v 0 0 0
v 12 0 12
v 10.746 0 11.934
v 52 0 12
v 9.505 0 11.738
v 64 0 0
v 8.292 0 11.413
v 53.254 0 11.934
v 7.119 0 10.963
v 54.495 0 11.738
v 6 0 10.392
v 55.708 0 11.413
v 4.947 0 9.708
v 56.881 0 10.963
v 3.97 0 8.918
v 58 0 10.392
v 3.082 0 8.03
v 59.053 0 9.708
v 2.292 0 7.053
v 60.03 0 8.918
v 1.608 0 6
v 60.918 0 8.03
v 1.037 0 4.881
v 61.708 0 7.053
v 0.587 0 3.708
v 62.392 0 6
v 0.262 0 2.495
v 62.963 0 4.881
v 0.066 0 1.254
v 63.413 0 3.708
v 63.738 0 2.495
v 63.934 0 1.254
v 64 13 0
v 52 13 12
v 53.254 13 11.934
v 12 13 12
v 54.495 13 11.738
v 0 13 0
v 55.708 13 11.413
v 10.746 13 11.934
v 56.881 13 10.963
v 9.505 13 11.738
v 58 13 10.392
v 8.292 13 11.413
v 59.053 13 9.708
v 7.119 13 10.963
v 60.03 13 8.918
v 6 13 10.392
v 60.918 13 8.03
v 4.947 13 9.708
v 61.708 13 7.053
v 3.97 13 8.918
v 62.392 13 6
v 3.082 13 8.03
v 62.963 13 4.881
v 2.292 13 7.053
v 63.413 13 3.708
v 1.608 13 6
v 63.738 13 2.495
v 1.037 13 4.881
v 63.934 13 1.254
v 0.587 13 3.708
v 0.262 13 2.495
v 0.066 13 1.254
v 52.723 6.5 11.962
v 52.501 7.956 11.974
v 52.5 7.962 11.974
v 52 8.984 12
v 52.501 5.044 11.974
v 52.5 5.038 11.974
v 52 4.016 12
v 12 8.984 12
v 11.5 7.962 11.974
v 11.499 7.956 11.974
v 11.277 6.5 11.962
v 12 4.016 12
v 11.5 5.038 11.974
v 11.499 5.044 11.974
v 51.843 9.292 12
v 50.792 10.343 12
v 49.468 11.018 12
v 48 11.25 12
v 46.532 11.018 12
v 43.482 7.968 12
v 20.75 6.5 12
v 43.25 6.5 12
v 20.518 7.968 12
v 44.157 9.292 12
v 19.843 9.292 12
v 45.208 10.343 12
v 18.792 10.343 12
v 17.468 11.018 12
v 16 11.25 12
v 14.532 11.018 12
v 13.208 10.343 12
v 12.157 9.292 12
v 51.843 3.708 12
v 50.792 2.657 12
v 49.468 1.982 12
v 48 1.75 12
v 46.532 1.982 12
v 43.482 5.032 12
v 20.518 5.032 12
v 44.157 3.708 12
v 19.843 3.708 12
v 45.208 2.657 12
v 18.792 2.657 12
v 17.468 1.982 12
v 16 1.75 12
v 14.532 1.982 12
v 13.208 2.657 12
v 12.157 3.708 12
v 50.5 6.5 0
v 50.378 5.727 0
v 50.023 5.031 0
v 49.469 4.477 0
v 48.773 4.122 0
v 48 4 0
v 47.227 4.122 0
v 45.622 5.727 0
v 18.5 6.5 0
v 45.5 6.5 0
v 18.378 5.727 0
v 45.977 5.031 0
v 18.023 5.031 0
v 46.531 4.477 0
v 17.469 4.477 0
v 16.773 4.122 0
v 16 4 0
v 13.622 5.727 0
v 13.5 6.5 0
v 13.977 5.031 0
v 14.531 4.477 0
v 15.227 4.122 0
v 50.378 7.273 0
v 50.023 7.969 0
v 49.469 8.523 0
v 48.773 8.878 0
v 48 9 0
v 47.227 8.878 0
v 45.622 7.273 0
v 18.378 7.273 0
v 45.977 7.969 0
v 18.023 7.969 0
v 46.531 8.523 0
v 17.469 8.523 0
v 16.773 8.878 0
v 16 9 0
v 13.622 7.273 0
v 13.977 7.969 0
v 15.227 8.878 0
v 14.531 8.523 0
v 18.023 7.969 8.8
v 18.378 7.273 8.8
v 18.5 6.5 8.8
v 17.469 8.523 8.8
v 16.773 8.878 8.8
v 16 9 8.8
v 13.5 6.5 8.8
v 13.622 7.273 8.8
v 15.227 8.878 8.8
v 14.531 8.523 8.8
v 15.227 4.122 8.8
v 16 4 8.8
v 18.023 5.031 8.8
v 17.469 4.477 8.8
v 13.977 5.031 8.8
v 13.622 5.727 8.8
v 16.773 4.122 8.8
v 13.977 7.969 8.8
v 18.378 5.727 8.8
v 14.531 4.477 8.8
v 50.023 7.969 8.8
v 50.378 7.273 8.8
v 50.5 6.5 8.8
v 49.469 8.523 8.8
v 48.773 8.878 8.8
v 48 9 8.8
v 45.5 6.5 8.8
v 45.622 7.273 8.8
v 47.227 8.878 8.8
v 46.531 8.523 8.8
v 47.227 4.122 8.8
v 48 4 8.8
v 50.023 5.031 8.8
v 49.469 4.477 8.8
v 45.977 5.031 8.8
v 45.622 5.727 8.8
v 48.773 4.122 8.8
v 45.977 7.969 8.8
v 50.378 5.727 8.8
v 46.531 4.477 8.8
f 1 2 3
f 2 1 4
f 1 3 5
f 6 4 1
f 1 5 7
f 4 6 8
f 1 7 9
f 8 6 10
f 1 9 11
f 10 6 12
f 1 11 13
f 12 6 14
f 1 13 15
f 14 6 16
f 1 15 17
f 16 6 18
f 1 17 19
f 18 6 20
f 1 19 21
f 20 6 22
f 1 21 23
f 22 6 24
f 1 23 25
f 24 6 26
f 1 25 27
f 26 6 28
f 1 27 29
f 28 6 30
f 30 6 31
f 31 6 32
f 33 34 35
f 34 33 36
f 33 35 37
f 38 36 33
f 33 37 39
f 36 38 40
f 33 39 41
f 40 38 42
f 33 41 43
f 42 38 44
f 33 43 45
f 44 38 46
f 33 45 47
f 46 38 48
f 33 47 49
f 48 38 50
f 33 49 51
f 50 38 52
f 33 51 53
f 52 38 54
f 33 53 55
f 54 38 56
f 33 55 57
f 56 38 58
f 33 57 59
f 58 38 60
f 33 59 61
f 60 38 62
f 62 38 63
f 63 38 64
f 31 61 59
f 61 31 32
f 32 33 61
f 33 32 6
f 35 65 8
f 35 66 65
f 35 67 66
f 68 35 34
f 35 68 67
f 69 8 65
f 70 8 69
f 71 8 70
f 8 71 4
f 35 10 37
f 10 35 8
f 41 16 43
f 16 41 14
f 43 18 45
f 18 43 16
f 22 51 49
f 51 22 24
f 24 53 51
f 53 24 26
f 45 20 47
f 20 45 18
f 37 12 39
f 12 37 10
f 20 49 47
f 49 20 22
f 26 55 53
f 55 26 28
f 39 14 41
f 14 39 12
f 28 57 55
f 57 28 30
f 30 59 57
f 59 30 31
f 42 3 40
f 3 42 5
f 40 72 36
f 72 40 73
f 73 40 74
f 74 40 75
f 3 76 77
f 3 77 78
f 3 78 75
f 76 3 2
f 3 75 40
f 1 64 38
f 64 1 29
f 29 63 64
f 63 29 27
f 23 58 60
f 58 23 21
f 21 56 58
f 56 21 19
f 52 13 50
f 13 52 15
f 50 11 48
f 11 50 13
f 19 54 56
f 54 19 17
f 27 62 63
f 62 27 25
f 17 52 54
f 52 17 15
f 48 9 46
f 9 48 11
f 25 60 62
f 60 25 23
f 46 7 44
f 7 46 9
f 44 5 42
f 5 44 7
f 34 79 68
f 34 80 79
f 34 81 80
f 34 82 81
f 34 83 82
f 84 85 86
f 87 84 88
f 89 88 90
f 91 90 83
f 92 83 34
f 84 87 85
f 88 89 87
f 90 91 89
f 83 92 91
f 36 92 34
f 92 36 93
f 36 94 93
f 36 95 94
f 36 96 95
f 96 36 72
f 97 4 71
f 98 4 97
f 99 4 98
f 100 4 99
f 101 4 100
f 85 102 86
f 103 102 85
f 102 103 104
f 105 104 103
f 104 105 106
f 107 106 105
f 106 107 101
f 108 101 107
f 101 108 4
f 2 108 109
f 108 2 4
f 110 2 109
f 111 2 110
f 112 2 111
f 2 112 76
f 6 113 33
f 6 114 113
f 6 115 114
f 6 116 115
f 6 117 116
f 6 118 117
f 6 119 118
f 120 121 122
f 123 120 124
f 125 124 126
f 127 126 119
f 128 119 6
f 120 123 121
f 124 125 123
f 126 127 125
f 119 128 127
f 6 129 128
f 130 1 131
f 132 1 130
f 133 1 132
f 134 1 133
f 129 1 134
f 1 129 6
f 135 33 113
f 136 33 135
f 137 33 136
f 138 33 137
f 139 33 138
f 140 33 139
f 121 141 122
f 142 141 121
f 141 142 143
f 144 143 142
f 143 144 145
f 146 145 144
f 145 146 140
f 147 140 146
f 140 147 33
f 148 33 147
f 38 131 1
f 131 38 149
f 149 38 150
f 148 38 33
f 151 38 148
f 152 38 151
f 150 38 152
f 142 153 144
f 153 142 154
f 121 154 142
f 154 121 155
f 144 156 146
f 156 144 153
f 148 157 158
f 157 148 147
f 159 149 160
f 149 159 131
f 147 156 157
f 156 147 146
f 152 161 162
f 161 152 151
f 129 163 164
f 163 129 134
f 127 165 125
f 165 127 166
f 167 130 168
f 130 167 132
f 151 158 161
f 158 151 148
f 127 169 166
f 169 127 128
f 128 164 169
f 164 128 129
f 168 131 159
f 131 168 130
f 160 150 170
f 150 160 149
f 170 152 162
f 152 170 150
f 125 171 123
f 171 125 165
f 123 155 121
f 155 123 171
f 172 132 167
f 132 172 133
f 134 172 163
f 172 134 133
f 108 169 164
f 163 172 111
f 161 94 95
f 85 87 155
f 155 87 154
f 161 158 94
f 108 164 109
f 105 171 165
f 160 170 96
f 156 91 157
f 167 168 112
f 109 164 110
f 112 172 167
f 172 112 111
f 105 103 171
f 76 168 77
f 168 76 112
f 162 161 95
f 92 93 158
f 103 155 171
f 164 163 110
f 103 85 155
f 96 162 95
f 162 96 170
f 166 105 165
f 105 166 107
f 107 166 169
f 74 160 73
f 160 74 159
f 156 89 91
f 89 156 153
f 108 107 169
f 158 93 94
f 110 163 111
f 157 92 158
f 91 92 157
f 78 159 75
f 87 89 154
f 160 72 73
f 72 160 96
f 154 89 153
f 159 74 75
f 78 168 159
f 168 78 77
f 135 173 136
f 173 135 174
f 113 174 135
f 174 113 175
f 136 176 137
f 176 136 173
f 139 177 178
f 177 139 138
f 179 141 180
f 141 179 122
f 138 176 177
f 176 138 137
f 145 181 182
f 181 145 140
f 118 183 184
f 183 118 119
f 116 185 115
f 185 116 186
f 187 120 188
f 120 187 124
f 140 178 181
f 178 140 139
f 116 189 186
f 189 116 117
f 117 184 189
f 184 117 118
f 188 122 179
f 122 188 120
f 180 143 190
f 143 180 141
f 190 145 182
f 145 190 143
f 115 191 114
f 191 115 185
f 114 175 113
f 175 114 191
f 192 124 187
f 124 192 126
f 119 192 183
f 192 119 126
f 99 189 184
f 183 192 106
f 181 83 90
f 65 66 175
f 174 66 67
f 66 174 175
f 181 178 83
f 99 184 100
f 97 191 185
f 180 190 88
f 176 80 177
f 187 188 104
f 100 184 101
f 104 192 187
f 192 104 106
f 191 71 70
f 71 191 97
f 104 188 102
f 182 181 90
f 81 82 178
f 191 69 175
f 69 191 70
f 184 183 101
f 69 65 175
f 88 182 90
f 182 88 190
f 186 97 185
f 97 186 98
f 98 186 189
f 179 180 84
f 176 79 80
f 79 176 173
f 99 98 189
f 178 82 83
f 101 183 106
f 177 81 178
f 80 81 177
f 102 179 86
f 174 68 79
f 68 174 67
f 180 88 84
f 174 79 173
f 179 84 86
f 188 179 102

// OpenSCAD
//width
w = 13;
//length
l = 64;
//height
h = 12;
//border radius
r = h;
//screw hole distance
hd = 32;
//screw hole radius
hr = 2.5;
//screw head cutout depth and bottom/top radius
hr2 = [3.2,hr,4.75];
//optional screw offset x
smx = 0;
//optional screw offset y
smy = 0;




module sr_cube(size=[1,1,1],radius=0.5,corners=[1,1,1,1]) {
    difference(){    
    cube(size);
    
        if(corners[0])
        translate([radius,radius,0])rotate([0,0,180])difference(){
                cube([radius*2,radius*2,size[2]]);
                cylinder(size[2],radius,radius);
        }
        if(corners[1])
        translate([size[0]-radius,radius,0])rotate([0,0,270])difference(){
                cube([radius*2,radius*2,size[2]]);
                cylinder(size[2],radius,radius);
        }
        if(corners[2])
        translate([size[0]-radius,size[1]-radius,0])rotate([0,0,0])difference(){
                cube([radius*2,radius*2,size[2]]);
                cylinder(size[2],radius,radius);
        }
        if(corners[3])
        translate([radius,size[1]-radius,0])rotate([0,0,90])difference(){
                cube([radius*2,radius*2,size[2]]);
                cylinder(size[2],radius,radius);
        }
        }
        
}

module screw_cutout() {
    cylinder(h,hr,hr,$fn=20); 
    translate([0,0,h-hr2[0]]) cylinder(hr2[0],hr2[1],hr2[2],$fn=20);
}

difference(){
translate([0,w,0])rotate([90,0,0])sr_cube([l,h,w],corners=[0,0,1,1],radius=r,$fn=60);
translate([(l-hd)/2+smx,w/2+smy,0]) screw_cutout(); 
translate([l-(l-hd)/2+smx,w/2+smy,0]) screw_cutout();

}
